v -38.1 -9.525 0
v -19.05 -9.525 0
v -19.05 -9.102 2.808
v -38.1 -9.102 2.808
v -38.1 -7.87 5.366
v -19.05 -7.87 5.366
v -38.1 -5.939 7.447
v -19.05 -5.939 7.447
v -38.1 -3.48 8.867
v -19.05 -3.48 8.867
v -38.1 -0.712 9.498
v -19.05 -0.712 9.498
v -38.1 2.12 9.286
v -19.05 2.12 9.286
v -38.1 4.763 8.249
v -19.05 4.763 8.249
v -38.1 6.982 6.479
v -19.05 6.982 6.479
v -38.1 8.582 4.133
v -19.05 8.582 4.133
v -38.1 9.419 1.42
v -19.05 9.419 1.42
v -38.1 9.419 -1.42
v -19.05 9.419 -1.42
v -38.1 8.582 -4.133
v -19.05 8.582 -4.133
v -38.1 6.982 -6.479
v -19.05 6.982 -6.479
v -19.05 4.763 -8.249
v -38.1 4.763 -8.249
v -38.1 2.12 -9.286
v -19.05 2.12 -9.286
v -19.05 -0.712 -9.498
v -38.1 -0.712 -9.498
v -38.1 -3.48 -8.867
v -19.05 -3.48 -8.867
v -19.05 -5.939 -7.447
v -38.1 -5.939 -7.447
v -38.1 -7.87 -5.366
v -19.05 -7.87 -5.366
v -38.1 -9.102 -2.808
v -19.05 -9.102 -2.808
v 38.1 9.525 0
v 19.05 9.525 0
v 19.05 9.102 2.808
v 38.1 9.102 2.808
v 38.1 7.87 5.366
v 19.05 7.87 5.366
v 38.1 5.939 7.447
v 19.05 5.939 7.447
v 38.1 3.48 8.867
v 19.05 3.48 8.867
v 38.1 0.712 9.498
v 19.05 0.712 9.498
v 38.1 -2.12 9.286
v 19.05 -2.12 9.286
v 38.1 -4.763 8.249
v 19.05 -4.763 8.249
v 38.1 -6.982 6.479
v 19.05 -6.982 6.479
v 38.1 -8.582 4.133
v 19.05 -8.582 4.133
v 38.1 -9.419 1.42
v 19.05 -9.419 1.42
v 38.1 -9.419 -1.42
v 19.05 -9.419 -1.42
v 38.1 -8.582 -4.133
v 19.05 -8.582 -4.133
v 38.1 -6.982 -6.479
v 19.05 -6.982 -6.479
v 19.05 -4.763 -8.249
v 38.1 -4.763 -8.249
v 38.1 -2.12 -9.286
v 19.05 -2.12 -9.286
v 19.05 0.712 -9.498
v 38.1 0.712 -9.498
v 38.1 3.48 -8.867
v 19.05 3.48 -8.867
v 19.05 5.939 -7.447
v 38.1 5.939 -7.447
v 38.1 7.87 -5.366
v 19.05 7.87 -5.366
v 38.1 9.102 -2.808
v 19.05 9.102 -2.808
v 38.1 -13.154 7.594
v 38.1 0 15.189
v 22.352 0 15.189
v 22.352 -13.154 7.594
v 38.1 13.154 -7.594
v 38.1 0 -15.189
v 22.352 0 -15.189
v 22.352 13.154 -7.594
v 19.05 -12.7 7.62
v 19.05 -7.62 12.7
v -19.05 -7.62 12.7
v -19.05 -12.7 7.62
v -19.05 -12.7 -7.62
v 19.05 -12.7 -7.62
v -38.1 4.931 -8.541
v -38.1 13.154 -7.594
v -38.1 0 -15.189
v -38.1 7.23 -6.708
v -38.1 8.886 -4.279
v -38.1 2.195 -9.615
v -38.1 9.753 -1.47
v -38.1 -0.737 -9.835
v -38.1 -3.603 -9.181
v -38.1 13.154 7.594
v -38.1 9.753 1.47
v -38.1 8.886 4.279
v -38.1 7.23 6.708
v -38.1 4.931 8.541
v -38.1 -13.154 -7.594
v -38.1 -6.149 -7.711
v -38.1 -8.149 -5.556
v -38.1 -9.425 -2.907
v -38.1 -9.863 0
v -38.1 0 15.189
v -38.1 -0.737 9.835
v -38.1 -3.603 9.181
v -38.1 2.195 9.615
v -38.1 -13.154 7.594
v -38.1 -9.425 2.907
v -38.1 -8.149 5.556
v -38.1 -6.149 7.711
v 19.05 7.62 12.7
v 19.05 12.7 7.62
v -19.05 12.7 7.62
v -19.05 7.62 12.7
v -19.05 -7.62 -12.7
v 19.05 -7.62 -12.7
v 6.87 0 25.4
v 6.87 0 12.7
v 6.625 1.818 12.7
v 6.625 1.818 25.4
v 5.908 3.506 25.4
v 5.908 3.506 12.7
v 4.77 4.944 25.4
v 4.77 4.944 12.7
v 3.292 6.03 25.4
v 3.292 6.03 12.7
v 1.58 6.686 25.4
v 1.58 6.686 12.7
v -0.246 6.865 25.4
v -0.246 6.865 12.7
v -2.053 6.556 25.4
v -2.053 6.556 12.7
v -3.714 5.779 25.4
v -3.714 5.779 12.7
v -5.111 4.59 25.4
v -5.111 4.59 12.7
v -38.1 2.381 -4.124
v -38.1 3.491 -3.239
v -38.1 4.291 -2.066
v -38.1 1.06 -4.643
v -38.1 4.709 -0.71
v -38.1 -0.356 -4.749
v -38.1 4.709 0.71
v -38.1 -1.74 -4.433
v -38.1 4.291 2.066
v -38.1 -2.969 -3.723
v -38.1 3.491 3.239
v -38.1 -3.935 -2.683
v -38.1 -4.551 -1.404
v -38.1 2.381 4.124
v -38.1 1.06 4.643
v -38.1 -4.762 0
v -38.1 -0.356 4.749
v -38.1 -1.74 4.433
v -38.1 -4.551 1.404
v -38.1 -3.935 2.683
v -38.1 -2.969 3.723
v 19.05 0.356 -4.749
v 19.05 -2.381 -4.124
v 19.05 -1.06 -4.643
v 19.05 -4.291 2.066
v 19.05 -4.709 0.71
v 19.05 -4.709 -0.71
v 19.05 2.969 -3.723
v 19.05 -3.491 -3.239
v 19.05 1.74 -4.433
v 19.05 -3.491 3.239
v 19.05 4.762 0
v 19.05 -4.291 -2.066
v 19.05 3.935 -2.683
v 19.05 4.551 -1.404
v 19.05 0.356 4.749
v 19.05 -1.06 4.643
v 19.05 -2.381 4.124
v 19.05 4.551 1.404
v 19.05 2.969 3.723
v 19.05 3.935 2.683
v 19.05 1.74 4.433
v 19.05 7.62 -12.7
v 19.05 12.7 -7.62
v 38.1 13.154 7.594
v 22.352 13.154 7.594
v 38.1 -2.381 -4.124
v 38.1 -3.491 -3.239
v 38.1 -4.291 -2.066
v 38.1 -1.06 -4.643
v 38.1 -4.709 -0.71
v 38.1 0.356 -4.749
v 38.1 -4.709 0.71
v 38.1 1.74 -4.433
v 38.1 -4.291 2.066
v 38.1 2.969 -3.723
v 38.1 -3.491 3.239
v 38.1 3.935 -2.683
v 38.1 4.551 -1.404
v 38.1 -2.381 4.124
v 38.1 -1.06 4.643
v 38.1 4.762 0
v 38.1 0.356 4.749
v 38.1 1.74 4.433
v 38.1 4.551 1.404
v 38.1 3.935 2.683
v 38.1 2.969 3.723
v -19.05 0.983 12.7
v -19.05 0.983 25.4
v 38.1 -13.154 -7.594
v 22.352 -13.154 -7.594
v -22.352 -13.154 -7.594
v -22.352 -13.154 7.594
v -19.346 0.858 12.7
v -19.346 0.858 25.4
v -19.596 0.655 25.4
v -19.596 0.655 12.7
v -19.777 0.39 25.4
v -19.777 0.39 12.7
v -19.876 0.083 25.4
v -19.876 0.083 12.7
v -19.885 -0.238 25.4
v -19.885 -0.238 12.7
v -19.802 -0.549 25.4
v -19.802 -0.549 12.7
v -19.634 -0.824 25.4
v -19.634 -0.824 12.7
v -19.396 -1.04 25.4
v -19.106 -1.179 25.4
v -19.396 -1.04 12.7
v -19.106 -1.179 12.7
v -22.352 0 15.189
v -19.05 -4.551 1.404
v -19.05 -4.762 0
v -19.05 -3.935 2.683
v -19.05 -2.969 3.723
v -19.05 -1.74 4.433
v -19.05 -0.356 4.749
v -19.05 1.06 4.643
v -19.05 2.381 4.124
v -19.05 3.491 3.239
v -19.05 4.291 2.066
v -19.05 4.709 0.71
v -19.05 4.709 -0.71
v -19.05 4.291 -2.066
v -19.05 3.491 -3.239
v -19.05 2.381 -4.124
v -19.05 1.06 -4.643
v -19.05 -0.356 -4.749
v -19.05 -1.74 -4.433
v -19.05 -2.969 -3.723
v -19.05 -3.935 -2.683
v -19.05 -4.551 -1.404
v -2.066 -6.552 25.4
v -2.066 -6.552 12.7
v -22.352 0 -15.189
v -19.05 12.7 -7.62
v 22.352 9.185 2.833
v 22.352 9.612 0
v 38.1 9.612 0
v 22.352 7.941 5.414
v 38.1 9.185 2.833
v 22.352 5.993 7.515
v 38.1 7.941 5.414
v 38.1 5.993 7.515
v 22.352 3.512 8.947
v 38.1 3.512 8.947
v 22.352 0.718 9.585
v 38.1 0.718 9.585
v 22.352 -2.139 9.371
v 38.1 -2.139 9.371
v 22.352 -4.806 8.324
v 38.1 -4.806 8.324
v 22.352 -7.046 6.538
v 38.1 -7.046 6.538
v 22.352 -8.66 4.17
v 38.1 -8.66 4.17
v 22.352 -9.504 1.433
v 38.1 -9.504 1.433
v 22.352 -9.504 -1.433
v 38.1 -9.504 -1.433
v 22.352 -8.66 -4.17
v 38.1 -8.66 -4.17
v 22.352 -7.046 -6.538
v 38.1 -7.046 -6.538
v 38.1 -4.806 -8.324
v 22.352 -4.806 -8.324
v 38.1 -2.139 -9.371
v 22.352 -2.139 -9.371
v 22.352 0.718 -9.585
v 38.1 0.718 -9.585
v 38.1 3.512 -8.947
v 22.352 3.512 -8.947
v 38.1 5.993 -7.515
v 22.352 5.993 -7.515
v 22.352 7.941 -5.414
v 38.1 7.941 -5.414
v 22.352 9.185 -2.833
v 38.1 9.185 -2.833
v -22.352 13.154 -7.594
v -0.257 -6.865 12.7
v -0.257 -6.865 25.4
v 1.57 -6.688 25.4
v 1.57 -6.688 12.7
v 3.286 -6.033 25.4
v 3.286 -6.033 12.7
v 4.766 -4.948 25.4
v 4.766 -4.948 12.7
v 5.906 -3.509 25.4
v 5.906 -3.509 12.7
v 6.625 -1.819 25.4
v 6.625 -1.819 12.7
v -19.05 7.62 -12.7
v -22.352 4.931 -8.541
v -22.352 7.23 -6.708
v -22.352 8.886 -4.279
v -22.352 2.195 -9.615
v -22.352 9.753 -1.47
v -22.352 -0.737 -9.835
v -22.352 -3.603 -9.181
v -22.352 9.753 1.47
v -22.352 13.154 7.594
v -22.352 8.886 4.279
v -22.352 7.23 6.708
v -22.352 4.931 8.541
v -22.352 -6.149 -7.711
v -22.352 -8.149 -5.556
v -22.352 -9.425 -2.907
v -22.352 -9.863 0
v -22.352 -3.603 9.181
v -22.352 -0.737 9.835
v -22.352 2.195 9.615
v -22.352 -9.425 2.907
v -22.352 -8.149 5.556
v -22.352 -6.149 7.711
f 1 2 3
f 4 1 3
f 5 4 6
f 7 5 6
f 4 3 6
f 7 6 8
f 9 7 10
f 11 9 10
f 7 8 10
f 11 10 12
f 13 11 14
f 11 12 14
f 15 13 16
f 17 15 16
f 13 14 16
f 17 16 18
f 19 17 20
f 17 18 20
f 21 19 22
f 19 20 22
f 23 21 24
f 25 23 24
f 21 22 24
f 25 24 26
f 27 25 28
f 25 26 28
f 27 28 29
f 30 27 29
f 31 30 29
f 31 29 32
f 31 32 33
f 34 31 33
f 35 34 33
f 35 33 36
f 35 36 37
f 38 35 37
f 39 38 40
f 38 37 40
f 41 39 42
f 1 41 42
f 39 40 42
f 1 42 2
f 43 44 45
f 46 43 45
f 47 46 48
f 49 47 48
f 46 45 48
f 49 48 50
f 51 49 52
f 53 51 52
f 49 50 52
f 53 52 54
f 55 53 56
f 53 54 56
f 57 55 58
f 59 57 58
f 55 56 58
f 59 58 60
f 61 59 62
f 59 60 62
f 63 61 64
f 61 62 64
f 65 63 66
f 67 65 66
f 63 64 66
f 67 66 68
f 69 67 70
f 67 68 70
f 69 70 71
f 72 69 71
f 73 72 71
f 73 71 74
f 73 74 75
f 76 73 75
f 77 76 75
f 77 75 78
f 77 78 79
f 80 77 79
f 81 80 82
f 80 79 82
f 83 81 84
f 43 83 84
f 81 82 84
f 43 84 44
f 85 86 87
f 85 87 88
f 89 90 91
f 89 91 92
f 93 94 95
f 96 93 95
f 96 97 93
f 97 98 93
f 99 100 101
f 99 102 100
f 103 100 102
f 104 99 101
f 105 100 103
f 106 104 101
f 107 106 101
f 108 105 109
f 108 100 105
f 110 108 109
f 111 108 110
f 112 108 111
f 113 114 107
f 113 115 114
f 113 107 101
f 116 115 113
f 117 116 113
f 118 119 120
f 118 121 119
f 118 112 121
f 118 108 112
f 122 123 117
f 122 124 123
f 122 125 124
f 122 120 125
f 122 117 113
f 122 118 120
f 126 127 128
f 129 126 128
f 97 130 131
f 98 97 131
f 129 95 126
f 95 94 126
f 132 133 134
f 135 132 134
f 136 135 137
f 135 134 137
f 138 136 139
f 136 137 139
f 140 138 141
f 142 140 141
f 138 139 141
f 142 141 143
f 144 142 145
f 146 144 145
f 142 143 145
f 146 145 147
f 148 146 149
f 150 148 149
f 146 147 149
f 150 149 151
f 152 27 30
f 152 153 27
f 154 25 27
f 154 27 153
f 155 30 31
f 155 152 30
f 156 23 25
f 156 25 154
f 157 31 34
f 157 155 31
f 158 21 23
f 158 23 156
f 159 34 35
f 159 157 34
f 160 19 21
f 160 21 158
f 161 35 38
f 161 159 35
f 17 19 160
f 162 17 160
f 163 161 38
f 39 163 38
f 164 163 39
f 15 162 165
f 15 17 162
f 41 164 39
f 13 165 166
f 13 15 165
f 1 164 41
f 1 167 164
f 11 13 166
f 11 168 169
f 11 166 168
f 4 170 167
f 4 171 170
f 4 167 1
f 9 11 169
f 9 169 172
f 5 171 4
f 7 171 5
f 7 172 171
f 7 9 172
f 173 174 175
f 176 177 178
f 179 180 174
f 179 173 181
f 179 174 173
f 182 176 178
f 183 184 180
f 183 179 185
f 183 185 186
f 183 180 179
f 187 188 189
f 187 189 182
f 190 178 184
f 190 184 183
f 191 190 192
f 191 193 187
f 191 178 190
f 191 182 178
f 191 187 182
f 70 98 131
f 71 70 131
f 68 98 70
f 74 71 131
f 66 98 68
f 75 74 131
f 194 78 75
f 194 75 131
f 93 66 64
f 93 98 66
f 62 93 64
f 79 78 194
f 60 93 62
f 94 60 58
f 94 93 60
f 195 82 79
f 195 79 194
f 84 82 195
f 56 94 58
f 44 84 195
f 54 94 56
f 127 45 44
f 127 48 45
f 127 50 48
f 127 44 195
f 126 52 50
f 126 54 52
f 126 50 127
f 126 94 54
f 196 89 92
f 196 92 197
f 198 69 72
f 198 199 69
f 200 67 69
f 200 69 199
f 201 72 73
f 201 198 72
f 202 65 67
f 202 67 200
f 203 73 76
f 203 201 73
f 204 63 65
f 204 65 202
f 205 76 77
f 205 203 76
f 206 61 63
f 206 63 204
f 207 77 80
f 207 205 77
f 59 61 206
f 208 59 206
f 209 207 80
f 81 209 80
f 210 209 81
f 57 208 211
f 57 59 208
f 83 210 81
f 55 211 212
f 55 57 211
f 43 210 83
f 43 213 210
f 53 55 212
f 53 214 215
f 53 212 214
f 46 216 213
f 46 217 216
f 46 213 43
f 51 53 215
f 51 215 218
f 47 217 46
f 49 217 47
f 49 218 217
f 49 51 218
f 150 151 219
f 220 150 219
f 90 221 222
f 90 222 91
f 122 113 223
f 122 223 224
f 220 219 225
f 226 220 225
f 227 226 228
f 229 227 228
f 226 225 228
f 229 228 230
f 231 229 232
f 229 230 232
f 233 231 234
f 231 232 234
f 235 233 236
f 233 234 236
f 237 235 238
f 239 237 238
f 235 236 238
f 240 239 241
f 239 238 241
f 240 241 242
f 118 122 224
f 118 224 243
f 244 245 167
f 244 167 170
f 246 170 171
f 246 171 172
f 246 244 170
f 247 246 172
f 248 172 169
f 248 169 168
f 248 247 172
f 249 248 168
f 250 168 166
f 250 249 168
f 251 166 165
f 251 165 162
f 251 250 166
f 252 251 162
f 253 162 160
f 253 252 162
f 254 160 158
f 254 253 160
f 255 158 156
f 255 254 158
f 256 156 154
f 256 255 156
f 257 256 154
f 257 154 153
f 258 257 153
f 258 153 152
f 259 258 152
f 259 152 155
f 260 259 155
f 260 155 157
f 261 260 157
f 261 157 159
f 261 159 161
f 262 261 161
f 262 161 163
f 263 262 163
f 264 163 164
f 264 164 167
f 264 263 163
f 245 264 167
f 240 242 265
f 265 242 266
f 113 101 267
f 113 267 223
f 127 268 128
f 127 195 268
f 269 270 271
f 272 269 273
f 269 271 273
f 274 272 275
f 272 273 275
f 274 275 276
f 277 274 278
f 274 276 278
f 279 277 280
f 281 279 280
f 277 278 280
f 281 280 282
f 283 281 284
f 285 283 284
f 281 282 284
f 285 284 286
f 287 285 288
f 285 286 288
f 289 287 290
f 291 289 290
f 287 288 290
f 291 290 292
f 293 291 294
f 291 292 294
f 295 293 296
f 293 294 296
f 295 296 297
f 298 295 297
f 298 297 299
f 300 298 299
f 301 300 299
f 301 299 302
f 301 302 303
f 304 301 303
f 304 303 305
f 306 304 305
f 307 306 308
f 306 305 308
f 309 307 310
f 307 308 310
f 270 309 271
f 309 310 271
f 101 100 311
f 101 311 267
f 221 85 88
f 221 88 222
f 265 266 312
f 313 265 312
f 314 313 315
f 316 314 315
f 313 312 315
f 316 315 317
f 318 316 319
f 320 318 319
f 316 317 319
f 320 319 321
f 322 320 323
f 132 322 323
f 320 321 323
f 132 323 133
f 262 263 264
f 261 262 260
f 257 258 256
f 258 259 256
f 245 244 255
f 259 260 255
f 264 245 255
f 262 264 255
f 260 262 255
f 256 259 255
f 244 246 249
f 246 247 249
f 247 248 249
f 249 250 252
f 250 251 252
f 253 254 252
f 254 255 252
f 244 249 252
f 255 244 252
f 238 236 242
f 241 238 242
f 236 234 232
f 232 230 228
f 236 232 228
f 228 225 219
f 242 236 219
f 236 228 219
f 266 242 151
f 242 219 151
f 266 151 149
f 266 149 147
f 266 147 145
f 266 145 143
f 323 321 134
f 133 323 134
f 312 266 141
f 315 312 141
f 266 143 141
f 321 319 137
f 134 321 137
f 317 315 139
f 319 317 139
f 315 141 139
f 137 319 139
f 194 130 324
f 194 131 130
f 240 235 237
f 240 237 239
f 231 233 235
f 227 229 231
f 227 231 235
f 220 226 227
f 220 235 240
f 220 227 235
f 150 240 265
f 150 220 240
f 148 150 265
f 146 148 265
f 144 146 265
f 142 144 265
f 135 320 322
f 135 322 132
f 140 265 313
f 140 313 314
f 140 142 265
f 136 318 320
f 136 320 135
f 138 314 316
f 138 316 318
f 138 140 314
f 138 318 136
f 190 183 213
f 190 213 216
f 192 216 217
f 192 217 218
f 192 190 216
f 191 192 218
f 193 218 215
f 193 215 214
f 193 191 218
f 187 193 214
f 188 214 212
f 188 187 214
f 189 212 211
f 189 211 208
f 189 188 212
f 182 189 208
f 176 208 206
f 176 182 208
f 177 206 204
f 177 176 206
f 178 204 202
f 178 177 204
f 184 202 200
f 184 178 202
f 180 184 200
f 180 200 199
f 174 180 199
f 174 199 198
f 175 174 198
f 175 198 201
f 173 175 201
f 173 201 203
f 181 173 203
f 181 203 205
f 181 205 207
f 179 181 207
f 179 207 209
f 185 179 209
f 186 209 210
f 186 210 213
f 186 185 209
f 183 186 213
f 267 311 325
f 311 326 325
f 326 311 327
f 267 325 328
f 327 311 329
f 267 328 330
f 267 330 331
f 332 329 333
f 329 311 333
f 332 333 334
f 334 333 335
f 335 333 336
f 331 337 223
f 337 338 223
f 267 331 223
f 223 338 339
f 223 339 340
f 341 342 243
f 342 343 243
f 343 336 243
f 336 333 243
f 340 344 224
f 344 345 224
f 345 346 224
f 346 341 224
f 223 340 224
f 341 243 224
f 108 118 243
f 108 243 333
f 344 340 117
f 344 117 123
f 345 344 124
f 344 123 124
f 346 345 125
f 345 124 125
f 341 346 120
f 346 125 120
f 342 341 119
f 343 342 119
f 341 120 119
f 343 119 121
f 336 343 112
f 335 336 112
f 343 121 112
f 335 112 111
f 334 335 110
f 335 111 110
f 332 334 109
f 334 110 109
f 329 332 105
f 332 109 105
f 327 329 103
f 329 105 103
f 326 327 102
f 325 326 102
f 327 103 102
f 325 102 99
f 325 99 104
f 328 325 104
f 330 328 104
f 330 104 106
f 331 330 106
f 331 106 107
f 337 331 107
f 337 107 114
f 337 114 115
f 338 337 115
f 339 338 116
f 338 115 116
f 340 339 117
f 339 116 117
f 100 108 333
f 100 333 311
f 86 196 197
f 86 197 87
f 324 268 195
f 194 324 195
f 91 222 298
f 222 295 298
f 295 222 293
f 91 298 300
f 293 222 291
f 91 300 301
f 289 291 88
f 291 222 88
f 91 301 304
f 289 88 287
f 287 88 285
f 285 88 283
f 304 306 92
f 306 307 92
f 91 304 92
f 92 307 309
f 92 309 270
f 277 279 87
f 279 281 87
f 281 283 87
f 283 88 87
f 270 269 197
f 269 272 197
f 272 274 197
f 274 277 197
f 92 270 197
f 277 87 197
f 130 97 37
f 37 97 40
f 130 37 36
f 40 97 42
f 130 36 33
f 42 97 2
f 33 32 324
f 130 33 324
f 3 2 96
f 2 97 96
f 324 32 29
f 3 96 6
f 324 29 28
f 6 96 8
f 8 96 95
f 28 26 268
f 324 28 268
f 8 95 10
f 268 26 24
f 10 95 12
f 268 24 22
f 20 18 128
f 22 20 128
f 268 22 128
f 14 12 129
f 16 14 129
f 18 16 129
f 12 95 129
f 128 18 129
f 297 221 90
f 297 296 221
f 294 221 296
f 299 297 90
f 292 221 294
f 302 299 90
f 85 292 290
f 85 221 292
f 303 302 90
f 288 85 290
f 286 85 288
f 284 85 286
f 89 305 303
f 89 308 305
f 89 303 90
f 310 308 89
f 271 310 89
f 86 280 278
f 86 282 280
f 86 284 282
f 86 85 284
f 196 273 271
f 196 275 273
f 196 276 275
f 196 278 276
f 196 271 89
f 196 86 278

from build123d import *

# Parameters (mm, degrees)
F0_W      = 25.4
F0_H      = 25.4
F1_DEPTH  = 19.05
F2_R      = 9.525
F2_R_2    = 4.7625
F3_DEPTH  = 19.05
F4_R      = 9.525
F4_R_2    = 4.7625
F5_DEPTH  = 19.05
F6_R      = 9.8627532025
F7_DEPTH  = 15.748
F8_R      = 9.6116225183
F9_DEPTH  = 15.748
F10_SIZE  = 5.08
F12_DEPTH = 12.7


with BuildPart() as f1:
    # F0 (on Right) → F1 (new body, symmetric)
    with BuildSketch(Plane.YZ):
        Rectangle(F0_W, F0_H)
    extrude(amount=F1_DEPTH, both=True)

    # F2 (on face) → F3 (join)
    with BuildSketch(Plane.YZ.offset(19.05)):
        Circle(F2_R)
        Circle(F2_R_2, mode=Mode.SUBTRACT)
    extrude(amount=F3_DEPTH)

    # F4 (on face) → F5 (join)
    with BuildSketch(Plane(origin=(-19.05, 0, 0), x_dir=(0, -1, 0), z_dir=(-1, 0, 0))):
        Circle(F4_R)
        Circle(F4_R_2, mode=Mode.SUBTRACT)
    extrude(amount=F5_DEPTH)

    # F10
    f10_edges = [f1.edges().sort_by_distance(p)[0] for p in [
        (0, 12.7, 12.7),
        (0, 12.7, -12.7),
        (0, -12.7, 12.7),
        (0, -12.7, -12.7),
    ]]
    chamfer(f10_edges, length=F10_SIZE)


with BuildPart() as f7:
    # F6 (on face) → F7 (new body)
    with BuildSketch(Plane(origin=(-38.1, 0, 0), x_dir=(0, -1, 0), z_dir=(-1, 0, 0))):
        Polygon((13.1536852568, -7.5942837239), (13.1536852568, 7.5942837239), (0, 15.1885674477), (-13.1536852568, 7.5942837239), (-13.1536852568, -7.5942837239), (0, -15.1885674477), align=None)
        Circle(F6_R, mode=Mode.SUBTRACT)
    extrude(amount=-F7_DEPTH)


with BuildPart() as f9:
    # F8 (on face) → F9 (new body)
    with BuildSketch(Plane.YZ.offset(38.1)):
        Polygon((13.1536852568, -7.5942837239), (13.1536852568, 7.5942837239), (0, 15.1885674477), (-13.1536852568, 7.5942837239), (-13.1536852568, -7.5942837239), (0, -15.1885674477), align=None)
        Circle(F8_R, mode=Mode.SUBTRACT)
    extrude(amount=-F9_DEPTH)


with BuildPart() as f12:
    # F11 (on face) → F12 (new body)
    with BuildSketch(Plane.XY.offset(12.7)):
        with BuildLine():
            ThreePointArc((-2.065765834, -6.5518572039), (4.0621923121, -5.5401096488), (6.869805041, 0))
            ThreePointArc((6.869805041, 0), (2.4578613882, 6.4150712153), (-5.1110702392, 4.5903357515))
            ThreePointArc((-5.1110702392, 4.5903357515), (-6.6267533505, -1.811176781), (-2.065765834, -6.5518572039))
        make_face()
        with BuildLine():
            ThreePointArc((-2.065765834, -6.5518572039), (-6.6267533505, -1.811176781), (-5.1110702392, 4.5903357515))
            Line((-5.1110702392, 4.5903357515), (-19.049598554, 0.9825973271))
            ThreePointArc((-19.049598554, 0.9825973271), (-19.8922110508, -0.0770417102), (-19.1059848489, -1.1791665074))
            Line((-19.1059848489, -1.1791665074), (-2.065765834, -6.5518572039))
        make_face()
    extrude(amount=F12_DEPTH)


solid = Compound([f1.part, f7.part, f9.part, f12.part])
